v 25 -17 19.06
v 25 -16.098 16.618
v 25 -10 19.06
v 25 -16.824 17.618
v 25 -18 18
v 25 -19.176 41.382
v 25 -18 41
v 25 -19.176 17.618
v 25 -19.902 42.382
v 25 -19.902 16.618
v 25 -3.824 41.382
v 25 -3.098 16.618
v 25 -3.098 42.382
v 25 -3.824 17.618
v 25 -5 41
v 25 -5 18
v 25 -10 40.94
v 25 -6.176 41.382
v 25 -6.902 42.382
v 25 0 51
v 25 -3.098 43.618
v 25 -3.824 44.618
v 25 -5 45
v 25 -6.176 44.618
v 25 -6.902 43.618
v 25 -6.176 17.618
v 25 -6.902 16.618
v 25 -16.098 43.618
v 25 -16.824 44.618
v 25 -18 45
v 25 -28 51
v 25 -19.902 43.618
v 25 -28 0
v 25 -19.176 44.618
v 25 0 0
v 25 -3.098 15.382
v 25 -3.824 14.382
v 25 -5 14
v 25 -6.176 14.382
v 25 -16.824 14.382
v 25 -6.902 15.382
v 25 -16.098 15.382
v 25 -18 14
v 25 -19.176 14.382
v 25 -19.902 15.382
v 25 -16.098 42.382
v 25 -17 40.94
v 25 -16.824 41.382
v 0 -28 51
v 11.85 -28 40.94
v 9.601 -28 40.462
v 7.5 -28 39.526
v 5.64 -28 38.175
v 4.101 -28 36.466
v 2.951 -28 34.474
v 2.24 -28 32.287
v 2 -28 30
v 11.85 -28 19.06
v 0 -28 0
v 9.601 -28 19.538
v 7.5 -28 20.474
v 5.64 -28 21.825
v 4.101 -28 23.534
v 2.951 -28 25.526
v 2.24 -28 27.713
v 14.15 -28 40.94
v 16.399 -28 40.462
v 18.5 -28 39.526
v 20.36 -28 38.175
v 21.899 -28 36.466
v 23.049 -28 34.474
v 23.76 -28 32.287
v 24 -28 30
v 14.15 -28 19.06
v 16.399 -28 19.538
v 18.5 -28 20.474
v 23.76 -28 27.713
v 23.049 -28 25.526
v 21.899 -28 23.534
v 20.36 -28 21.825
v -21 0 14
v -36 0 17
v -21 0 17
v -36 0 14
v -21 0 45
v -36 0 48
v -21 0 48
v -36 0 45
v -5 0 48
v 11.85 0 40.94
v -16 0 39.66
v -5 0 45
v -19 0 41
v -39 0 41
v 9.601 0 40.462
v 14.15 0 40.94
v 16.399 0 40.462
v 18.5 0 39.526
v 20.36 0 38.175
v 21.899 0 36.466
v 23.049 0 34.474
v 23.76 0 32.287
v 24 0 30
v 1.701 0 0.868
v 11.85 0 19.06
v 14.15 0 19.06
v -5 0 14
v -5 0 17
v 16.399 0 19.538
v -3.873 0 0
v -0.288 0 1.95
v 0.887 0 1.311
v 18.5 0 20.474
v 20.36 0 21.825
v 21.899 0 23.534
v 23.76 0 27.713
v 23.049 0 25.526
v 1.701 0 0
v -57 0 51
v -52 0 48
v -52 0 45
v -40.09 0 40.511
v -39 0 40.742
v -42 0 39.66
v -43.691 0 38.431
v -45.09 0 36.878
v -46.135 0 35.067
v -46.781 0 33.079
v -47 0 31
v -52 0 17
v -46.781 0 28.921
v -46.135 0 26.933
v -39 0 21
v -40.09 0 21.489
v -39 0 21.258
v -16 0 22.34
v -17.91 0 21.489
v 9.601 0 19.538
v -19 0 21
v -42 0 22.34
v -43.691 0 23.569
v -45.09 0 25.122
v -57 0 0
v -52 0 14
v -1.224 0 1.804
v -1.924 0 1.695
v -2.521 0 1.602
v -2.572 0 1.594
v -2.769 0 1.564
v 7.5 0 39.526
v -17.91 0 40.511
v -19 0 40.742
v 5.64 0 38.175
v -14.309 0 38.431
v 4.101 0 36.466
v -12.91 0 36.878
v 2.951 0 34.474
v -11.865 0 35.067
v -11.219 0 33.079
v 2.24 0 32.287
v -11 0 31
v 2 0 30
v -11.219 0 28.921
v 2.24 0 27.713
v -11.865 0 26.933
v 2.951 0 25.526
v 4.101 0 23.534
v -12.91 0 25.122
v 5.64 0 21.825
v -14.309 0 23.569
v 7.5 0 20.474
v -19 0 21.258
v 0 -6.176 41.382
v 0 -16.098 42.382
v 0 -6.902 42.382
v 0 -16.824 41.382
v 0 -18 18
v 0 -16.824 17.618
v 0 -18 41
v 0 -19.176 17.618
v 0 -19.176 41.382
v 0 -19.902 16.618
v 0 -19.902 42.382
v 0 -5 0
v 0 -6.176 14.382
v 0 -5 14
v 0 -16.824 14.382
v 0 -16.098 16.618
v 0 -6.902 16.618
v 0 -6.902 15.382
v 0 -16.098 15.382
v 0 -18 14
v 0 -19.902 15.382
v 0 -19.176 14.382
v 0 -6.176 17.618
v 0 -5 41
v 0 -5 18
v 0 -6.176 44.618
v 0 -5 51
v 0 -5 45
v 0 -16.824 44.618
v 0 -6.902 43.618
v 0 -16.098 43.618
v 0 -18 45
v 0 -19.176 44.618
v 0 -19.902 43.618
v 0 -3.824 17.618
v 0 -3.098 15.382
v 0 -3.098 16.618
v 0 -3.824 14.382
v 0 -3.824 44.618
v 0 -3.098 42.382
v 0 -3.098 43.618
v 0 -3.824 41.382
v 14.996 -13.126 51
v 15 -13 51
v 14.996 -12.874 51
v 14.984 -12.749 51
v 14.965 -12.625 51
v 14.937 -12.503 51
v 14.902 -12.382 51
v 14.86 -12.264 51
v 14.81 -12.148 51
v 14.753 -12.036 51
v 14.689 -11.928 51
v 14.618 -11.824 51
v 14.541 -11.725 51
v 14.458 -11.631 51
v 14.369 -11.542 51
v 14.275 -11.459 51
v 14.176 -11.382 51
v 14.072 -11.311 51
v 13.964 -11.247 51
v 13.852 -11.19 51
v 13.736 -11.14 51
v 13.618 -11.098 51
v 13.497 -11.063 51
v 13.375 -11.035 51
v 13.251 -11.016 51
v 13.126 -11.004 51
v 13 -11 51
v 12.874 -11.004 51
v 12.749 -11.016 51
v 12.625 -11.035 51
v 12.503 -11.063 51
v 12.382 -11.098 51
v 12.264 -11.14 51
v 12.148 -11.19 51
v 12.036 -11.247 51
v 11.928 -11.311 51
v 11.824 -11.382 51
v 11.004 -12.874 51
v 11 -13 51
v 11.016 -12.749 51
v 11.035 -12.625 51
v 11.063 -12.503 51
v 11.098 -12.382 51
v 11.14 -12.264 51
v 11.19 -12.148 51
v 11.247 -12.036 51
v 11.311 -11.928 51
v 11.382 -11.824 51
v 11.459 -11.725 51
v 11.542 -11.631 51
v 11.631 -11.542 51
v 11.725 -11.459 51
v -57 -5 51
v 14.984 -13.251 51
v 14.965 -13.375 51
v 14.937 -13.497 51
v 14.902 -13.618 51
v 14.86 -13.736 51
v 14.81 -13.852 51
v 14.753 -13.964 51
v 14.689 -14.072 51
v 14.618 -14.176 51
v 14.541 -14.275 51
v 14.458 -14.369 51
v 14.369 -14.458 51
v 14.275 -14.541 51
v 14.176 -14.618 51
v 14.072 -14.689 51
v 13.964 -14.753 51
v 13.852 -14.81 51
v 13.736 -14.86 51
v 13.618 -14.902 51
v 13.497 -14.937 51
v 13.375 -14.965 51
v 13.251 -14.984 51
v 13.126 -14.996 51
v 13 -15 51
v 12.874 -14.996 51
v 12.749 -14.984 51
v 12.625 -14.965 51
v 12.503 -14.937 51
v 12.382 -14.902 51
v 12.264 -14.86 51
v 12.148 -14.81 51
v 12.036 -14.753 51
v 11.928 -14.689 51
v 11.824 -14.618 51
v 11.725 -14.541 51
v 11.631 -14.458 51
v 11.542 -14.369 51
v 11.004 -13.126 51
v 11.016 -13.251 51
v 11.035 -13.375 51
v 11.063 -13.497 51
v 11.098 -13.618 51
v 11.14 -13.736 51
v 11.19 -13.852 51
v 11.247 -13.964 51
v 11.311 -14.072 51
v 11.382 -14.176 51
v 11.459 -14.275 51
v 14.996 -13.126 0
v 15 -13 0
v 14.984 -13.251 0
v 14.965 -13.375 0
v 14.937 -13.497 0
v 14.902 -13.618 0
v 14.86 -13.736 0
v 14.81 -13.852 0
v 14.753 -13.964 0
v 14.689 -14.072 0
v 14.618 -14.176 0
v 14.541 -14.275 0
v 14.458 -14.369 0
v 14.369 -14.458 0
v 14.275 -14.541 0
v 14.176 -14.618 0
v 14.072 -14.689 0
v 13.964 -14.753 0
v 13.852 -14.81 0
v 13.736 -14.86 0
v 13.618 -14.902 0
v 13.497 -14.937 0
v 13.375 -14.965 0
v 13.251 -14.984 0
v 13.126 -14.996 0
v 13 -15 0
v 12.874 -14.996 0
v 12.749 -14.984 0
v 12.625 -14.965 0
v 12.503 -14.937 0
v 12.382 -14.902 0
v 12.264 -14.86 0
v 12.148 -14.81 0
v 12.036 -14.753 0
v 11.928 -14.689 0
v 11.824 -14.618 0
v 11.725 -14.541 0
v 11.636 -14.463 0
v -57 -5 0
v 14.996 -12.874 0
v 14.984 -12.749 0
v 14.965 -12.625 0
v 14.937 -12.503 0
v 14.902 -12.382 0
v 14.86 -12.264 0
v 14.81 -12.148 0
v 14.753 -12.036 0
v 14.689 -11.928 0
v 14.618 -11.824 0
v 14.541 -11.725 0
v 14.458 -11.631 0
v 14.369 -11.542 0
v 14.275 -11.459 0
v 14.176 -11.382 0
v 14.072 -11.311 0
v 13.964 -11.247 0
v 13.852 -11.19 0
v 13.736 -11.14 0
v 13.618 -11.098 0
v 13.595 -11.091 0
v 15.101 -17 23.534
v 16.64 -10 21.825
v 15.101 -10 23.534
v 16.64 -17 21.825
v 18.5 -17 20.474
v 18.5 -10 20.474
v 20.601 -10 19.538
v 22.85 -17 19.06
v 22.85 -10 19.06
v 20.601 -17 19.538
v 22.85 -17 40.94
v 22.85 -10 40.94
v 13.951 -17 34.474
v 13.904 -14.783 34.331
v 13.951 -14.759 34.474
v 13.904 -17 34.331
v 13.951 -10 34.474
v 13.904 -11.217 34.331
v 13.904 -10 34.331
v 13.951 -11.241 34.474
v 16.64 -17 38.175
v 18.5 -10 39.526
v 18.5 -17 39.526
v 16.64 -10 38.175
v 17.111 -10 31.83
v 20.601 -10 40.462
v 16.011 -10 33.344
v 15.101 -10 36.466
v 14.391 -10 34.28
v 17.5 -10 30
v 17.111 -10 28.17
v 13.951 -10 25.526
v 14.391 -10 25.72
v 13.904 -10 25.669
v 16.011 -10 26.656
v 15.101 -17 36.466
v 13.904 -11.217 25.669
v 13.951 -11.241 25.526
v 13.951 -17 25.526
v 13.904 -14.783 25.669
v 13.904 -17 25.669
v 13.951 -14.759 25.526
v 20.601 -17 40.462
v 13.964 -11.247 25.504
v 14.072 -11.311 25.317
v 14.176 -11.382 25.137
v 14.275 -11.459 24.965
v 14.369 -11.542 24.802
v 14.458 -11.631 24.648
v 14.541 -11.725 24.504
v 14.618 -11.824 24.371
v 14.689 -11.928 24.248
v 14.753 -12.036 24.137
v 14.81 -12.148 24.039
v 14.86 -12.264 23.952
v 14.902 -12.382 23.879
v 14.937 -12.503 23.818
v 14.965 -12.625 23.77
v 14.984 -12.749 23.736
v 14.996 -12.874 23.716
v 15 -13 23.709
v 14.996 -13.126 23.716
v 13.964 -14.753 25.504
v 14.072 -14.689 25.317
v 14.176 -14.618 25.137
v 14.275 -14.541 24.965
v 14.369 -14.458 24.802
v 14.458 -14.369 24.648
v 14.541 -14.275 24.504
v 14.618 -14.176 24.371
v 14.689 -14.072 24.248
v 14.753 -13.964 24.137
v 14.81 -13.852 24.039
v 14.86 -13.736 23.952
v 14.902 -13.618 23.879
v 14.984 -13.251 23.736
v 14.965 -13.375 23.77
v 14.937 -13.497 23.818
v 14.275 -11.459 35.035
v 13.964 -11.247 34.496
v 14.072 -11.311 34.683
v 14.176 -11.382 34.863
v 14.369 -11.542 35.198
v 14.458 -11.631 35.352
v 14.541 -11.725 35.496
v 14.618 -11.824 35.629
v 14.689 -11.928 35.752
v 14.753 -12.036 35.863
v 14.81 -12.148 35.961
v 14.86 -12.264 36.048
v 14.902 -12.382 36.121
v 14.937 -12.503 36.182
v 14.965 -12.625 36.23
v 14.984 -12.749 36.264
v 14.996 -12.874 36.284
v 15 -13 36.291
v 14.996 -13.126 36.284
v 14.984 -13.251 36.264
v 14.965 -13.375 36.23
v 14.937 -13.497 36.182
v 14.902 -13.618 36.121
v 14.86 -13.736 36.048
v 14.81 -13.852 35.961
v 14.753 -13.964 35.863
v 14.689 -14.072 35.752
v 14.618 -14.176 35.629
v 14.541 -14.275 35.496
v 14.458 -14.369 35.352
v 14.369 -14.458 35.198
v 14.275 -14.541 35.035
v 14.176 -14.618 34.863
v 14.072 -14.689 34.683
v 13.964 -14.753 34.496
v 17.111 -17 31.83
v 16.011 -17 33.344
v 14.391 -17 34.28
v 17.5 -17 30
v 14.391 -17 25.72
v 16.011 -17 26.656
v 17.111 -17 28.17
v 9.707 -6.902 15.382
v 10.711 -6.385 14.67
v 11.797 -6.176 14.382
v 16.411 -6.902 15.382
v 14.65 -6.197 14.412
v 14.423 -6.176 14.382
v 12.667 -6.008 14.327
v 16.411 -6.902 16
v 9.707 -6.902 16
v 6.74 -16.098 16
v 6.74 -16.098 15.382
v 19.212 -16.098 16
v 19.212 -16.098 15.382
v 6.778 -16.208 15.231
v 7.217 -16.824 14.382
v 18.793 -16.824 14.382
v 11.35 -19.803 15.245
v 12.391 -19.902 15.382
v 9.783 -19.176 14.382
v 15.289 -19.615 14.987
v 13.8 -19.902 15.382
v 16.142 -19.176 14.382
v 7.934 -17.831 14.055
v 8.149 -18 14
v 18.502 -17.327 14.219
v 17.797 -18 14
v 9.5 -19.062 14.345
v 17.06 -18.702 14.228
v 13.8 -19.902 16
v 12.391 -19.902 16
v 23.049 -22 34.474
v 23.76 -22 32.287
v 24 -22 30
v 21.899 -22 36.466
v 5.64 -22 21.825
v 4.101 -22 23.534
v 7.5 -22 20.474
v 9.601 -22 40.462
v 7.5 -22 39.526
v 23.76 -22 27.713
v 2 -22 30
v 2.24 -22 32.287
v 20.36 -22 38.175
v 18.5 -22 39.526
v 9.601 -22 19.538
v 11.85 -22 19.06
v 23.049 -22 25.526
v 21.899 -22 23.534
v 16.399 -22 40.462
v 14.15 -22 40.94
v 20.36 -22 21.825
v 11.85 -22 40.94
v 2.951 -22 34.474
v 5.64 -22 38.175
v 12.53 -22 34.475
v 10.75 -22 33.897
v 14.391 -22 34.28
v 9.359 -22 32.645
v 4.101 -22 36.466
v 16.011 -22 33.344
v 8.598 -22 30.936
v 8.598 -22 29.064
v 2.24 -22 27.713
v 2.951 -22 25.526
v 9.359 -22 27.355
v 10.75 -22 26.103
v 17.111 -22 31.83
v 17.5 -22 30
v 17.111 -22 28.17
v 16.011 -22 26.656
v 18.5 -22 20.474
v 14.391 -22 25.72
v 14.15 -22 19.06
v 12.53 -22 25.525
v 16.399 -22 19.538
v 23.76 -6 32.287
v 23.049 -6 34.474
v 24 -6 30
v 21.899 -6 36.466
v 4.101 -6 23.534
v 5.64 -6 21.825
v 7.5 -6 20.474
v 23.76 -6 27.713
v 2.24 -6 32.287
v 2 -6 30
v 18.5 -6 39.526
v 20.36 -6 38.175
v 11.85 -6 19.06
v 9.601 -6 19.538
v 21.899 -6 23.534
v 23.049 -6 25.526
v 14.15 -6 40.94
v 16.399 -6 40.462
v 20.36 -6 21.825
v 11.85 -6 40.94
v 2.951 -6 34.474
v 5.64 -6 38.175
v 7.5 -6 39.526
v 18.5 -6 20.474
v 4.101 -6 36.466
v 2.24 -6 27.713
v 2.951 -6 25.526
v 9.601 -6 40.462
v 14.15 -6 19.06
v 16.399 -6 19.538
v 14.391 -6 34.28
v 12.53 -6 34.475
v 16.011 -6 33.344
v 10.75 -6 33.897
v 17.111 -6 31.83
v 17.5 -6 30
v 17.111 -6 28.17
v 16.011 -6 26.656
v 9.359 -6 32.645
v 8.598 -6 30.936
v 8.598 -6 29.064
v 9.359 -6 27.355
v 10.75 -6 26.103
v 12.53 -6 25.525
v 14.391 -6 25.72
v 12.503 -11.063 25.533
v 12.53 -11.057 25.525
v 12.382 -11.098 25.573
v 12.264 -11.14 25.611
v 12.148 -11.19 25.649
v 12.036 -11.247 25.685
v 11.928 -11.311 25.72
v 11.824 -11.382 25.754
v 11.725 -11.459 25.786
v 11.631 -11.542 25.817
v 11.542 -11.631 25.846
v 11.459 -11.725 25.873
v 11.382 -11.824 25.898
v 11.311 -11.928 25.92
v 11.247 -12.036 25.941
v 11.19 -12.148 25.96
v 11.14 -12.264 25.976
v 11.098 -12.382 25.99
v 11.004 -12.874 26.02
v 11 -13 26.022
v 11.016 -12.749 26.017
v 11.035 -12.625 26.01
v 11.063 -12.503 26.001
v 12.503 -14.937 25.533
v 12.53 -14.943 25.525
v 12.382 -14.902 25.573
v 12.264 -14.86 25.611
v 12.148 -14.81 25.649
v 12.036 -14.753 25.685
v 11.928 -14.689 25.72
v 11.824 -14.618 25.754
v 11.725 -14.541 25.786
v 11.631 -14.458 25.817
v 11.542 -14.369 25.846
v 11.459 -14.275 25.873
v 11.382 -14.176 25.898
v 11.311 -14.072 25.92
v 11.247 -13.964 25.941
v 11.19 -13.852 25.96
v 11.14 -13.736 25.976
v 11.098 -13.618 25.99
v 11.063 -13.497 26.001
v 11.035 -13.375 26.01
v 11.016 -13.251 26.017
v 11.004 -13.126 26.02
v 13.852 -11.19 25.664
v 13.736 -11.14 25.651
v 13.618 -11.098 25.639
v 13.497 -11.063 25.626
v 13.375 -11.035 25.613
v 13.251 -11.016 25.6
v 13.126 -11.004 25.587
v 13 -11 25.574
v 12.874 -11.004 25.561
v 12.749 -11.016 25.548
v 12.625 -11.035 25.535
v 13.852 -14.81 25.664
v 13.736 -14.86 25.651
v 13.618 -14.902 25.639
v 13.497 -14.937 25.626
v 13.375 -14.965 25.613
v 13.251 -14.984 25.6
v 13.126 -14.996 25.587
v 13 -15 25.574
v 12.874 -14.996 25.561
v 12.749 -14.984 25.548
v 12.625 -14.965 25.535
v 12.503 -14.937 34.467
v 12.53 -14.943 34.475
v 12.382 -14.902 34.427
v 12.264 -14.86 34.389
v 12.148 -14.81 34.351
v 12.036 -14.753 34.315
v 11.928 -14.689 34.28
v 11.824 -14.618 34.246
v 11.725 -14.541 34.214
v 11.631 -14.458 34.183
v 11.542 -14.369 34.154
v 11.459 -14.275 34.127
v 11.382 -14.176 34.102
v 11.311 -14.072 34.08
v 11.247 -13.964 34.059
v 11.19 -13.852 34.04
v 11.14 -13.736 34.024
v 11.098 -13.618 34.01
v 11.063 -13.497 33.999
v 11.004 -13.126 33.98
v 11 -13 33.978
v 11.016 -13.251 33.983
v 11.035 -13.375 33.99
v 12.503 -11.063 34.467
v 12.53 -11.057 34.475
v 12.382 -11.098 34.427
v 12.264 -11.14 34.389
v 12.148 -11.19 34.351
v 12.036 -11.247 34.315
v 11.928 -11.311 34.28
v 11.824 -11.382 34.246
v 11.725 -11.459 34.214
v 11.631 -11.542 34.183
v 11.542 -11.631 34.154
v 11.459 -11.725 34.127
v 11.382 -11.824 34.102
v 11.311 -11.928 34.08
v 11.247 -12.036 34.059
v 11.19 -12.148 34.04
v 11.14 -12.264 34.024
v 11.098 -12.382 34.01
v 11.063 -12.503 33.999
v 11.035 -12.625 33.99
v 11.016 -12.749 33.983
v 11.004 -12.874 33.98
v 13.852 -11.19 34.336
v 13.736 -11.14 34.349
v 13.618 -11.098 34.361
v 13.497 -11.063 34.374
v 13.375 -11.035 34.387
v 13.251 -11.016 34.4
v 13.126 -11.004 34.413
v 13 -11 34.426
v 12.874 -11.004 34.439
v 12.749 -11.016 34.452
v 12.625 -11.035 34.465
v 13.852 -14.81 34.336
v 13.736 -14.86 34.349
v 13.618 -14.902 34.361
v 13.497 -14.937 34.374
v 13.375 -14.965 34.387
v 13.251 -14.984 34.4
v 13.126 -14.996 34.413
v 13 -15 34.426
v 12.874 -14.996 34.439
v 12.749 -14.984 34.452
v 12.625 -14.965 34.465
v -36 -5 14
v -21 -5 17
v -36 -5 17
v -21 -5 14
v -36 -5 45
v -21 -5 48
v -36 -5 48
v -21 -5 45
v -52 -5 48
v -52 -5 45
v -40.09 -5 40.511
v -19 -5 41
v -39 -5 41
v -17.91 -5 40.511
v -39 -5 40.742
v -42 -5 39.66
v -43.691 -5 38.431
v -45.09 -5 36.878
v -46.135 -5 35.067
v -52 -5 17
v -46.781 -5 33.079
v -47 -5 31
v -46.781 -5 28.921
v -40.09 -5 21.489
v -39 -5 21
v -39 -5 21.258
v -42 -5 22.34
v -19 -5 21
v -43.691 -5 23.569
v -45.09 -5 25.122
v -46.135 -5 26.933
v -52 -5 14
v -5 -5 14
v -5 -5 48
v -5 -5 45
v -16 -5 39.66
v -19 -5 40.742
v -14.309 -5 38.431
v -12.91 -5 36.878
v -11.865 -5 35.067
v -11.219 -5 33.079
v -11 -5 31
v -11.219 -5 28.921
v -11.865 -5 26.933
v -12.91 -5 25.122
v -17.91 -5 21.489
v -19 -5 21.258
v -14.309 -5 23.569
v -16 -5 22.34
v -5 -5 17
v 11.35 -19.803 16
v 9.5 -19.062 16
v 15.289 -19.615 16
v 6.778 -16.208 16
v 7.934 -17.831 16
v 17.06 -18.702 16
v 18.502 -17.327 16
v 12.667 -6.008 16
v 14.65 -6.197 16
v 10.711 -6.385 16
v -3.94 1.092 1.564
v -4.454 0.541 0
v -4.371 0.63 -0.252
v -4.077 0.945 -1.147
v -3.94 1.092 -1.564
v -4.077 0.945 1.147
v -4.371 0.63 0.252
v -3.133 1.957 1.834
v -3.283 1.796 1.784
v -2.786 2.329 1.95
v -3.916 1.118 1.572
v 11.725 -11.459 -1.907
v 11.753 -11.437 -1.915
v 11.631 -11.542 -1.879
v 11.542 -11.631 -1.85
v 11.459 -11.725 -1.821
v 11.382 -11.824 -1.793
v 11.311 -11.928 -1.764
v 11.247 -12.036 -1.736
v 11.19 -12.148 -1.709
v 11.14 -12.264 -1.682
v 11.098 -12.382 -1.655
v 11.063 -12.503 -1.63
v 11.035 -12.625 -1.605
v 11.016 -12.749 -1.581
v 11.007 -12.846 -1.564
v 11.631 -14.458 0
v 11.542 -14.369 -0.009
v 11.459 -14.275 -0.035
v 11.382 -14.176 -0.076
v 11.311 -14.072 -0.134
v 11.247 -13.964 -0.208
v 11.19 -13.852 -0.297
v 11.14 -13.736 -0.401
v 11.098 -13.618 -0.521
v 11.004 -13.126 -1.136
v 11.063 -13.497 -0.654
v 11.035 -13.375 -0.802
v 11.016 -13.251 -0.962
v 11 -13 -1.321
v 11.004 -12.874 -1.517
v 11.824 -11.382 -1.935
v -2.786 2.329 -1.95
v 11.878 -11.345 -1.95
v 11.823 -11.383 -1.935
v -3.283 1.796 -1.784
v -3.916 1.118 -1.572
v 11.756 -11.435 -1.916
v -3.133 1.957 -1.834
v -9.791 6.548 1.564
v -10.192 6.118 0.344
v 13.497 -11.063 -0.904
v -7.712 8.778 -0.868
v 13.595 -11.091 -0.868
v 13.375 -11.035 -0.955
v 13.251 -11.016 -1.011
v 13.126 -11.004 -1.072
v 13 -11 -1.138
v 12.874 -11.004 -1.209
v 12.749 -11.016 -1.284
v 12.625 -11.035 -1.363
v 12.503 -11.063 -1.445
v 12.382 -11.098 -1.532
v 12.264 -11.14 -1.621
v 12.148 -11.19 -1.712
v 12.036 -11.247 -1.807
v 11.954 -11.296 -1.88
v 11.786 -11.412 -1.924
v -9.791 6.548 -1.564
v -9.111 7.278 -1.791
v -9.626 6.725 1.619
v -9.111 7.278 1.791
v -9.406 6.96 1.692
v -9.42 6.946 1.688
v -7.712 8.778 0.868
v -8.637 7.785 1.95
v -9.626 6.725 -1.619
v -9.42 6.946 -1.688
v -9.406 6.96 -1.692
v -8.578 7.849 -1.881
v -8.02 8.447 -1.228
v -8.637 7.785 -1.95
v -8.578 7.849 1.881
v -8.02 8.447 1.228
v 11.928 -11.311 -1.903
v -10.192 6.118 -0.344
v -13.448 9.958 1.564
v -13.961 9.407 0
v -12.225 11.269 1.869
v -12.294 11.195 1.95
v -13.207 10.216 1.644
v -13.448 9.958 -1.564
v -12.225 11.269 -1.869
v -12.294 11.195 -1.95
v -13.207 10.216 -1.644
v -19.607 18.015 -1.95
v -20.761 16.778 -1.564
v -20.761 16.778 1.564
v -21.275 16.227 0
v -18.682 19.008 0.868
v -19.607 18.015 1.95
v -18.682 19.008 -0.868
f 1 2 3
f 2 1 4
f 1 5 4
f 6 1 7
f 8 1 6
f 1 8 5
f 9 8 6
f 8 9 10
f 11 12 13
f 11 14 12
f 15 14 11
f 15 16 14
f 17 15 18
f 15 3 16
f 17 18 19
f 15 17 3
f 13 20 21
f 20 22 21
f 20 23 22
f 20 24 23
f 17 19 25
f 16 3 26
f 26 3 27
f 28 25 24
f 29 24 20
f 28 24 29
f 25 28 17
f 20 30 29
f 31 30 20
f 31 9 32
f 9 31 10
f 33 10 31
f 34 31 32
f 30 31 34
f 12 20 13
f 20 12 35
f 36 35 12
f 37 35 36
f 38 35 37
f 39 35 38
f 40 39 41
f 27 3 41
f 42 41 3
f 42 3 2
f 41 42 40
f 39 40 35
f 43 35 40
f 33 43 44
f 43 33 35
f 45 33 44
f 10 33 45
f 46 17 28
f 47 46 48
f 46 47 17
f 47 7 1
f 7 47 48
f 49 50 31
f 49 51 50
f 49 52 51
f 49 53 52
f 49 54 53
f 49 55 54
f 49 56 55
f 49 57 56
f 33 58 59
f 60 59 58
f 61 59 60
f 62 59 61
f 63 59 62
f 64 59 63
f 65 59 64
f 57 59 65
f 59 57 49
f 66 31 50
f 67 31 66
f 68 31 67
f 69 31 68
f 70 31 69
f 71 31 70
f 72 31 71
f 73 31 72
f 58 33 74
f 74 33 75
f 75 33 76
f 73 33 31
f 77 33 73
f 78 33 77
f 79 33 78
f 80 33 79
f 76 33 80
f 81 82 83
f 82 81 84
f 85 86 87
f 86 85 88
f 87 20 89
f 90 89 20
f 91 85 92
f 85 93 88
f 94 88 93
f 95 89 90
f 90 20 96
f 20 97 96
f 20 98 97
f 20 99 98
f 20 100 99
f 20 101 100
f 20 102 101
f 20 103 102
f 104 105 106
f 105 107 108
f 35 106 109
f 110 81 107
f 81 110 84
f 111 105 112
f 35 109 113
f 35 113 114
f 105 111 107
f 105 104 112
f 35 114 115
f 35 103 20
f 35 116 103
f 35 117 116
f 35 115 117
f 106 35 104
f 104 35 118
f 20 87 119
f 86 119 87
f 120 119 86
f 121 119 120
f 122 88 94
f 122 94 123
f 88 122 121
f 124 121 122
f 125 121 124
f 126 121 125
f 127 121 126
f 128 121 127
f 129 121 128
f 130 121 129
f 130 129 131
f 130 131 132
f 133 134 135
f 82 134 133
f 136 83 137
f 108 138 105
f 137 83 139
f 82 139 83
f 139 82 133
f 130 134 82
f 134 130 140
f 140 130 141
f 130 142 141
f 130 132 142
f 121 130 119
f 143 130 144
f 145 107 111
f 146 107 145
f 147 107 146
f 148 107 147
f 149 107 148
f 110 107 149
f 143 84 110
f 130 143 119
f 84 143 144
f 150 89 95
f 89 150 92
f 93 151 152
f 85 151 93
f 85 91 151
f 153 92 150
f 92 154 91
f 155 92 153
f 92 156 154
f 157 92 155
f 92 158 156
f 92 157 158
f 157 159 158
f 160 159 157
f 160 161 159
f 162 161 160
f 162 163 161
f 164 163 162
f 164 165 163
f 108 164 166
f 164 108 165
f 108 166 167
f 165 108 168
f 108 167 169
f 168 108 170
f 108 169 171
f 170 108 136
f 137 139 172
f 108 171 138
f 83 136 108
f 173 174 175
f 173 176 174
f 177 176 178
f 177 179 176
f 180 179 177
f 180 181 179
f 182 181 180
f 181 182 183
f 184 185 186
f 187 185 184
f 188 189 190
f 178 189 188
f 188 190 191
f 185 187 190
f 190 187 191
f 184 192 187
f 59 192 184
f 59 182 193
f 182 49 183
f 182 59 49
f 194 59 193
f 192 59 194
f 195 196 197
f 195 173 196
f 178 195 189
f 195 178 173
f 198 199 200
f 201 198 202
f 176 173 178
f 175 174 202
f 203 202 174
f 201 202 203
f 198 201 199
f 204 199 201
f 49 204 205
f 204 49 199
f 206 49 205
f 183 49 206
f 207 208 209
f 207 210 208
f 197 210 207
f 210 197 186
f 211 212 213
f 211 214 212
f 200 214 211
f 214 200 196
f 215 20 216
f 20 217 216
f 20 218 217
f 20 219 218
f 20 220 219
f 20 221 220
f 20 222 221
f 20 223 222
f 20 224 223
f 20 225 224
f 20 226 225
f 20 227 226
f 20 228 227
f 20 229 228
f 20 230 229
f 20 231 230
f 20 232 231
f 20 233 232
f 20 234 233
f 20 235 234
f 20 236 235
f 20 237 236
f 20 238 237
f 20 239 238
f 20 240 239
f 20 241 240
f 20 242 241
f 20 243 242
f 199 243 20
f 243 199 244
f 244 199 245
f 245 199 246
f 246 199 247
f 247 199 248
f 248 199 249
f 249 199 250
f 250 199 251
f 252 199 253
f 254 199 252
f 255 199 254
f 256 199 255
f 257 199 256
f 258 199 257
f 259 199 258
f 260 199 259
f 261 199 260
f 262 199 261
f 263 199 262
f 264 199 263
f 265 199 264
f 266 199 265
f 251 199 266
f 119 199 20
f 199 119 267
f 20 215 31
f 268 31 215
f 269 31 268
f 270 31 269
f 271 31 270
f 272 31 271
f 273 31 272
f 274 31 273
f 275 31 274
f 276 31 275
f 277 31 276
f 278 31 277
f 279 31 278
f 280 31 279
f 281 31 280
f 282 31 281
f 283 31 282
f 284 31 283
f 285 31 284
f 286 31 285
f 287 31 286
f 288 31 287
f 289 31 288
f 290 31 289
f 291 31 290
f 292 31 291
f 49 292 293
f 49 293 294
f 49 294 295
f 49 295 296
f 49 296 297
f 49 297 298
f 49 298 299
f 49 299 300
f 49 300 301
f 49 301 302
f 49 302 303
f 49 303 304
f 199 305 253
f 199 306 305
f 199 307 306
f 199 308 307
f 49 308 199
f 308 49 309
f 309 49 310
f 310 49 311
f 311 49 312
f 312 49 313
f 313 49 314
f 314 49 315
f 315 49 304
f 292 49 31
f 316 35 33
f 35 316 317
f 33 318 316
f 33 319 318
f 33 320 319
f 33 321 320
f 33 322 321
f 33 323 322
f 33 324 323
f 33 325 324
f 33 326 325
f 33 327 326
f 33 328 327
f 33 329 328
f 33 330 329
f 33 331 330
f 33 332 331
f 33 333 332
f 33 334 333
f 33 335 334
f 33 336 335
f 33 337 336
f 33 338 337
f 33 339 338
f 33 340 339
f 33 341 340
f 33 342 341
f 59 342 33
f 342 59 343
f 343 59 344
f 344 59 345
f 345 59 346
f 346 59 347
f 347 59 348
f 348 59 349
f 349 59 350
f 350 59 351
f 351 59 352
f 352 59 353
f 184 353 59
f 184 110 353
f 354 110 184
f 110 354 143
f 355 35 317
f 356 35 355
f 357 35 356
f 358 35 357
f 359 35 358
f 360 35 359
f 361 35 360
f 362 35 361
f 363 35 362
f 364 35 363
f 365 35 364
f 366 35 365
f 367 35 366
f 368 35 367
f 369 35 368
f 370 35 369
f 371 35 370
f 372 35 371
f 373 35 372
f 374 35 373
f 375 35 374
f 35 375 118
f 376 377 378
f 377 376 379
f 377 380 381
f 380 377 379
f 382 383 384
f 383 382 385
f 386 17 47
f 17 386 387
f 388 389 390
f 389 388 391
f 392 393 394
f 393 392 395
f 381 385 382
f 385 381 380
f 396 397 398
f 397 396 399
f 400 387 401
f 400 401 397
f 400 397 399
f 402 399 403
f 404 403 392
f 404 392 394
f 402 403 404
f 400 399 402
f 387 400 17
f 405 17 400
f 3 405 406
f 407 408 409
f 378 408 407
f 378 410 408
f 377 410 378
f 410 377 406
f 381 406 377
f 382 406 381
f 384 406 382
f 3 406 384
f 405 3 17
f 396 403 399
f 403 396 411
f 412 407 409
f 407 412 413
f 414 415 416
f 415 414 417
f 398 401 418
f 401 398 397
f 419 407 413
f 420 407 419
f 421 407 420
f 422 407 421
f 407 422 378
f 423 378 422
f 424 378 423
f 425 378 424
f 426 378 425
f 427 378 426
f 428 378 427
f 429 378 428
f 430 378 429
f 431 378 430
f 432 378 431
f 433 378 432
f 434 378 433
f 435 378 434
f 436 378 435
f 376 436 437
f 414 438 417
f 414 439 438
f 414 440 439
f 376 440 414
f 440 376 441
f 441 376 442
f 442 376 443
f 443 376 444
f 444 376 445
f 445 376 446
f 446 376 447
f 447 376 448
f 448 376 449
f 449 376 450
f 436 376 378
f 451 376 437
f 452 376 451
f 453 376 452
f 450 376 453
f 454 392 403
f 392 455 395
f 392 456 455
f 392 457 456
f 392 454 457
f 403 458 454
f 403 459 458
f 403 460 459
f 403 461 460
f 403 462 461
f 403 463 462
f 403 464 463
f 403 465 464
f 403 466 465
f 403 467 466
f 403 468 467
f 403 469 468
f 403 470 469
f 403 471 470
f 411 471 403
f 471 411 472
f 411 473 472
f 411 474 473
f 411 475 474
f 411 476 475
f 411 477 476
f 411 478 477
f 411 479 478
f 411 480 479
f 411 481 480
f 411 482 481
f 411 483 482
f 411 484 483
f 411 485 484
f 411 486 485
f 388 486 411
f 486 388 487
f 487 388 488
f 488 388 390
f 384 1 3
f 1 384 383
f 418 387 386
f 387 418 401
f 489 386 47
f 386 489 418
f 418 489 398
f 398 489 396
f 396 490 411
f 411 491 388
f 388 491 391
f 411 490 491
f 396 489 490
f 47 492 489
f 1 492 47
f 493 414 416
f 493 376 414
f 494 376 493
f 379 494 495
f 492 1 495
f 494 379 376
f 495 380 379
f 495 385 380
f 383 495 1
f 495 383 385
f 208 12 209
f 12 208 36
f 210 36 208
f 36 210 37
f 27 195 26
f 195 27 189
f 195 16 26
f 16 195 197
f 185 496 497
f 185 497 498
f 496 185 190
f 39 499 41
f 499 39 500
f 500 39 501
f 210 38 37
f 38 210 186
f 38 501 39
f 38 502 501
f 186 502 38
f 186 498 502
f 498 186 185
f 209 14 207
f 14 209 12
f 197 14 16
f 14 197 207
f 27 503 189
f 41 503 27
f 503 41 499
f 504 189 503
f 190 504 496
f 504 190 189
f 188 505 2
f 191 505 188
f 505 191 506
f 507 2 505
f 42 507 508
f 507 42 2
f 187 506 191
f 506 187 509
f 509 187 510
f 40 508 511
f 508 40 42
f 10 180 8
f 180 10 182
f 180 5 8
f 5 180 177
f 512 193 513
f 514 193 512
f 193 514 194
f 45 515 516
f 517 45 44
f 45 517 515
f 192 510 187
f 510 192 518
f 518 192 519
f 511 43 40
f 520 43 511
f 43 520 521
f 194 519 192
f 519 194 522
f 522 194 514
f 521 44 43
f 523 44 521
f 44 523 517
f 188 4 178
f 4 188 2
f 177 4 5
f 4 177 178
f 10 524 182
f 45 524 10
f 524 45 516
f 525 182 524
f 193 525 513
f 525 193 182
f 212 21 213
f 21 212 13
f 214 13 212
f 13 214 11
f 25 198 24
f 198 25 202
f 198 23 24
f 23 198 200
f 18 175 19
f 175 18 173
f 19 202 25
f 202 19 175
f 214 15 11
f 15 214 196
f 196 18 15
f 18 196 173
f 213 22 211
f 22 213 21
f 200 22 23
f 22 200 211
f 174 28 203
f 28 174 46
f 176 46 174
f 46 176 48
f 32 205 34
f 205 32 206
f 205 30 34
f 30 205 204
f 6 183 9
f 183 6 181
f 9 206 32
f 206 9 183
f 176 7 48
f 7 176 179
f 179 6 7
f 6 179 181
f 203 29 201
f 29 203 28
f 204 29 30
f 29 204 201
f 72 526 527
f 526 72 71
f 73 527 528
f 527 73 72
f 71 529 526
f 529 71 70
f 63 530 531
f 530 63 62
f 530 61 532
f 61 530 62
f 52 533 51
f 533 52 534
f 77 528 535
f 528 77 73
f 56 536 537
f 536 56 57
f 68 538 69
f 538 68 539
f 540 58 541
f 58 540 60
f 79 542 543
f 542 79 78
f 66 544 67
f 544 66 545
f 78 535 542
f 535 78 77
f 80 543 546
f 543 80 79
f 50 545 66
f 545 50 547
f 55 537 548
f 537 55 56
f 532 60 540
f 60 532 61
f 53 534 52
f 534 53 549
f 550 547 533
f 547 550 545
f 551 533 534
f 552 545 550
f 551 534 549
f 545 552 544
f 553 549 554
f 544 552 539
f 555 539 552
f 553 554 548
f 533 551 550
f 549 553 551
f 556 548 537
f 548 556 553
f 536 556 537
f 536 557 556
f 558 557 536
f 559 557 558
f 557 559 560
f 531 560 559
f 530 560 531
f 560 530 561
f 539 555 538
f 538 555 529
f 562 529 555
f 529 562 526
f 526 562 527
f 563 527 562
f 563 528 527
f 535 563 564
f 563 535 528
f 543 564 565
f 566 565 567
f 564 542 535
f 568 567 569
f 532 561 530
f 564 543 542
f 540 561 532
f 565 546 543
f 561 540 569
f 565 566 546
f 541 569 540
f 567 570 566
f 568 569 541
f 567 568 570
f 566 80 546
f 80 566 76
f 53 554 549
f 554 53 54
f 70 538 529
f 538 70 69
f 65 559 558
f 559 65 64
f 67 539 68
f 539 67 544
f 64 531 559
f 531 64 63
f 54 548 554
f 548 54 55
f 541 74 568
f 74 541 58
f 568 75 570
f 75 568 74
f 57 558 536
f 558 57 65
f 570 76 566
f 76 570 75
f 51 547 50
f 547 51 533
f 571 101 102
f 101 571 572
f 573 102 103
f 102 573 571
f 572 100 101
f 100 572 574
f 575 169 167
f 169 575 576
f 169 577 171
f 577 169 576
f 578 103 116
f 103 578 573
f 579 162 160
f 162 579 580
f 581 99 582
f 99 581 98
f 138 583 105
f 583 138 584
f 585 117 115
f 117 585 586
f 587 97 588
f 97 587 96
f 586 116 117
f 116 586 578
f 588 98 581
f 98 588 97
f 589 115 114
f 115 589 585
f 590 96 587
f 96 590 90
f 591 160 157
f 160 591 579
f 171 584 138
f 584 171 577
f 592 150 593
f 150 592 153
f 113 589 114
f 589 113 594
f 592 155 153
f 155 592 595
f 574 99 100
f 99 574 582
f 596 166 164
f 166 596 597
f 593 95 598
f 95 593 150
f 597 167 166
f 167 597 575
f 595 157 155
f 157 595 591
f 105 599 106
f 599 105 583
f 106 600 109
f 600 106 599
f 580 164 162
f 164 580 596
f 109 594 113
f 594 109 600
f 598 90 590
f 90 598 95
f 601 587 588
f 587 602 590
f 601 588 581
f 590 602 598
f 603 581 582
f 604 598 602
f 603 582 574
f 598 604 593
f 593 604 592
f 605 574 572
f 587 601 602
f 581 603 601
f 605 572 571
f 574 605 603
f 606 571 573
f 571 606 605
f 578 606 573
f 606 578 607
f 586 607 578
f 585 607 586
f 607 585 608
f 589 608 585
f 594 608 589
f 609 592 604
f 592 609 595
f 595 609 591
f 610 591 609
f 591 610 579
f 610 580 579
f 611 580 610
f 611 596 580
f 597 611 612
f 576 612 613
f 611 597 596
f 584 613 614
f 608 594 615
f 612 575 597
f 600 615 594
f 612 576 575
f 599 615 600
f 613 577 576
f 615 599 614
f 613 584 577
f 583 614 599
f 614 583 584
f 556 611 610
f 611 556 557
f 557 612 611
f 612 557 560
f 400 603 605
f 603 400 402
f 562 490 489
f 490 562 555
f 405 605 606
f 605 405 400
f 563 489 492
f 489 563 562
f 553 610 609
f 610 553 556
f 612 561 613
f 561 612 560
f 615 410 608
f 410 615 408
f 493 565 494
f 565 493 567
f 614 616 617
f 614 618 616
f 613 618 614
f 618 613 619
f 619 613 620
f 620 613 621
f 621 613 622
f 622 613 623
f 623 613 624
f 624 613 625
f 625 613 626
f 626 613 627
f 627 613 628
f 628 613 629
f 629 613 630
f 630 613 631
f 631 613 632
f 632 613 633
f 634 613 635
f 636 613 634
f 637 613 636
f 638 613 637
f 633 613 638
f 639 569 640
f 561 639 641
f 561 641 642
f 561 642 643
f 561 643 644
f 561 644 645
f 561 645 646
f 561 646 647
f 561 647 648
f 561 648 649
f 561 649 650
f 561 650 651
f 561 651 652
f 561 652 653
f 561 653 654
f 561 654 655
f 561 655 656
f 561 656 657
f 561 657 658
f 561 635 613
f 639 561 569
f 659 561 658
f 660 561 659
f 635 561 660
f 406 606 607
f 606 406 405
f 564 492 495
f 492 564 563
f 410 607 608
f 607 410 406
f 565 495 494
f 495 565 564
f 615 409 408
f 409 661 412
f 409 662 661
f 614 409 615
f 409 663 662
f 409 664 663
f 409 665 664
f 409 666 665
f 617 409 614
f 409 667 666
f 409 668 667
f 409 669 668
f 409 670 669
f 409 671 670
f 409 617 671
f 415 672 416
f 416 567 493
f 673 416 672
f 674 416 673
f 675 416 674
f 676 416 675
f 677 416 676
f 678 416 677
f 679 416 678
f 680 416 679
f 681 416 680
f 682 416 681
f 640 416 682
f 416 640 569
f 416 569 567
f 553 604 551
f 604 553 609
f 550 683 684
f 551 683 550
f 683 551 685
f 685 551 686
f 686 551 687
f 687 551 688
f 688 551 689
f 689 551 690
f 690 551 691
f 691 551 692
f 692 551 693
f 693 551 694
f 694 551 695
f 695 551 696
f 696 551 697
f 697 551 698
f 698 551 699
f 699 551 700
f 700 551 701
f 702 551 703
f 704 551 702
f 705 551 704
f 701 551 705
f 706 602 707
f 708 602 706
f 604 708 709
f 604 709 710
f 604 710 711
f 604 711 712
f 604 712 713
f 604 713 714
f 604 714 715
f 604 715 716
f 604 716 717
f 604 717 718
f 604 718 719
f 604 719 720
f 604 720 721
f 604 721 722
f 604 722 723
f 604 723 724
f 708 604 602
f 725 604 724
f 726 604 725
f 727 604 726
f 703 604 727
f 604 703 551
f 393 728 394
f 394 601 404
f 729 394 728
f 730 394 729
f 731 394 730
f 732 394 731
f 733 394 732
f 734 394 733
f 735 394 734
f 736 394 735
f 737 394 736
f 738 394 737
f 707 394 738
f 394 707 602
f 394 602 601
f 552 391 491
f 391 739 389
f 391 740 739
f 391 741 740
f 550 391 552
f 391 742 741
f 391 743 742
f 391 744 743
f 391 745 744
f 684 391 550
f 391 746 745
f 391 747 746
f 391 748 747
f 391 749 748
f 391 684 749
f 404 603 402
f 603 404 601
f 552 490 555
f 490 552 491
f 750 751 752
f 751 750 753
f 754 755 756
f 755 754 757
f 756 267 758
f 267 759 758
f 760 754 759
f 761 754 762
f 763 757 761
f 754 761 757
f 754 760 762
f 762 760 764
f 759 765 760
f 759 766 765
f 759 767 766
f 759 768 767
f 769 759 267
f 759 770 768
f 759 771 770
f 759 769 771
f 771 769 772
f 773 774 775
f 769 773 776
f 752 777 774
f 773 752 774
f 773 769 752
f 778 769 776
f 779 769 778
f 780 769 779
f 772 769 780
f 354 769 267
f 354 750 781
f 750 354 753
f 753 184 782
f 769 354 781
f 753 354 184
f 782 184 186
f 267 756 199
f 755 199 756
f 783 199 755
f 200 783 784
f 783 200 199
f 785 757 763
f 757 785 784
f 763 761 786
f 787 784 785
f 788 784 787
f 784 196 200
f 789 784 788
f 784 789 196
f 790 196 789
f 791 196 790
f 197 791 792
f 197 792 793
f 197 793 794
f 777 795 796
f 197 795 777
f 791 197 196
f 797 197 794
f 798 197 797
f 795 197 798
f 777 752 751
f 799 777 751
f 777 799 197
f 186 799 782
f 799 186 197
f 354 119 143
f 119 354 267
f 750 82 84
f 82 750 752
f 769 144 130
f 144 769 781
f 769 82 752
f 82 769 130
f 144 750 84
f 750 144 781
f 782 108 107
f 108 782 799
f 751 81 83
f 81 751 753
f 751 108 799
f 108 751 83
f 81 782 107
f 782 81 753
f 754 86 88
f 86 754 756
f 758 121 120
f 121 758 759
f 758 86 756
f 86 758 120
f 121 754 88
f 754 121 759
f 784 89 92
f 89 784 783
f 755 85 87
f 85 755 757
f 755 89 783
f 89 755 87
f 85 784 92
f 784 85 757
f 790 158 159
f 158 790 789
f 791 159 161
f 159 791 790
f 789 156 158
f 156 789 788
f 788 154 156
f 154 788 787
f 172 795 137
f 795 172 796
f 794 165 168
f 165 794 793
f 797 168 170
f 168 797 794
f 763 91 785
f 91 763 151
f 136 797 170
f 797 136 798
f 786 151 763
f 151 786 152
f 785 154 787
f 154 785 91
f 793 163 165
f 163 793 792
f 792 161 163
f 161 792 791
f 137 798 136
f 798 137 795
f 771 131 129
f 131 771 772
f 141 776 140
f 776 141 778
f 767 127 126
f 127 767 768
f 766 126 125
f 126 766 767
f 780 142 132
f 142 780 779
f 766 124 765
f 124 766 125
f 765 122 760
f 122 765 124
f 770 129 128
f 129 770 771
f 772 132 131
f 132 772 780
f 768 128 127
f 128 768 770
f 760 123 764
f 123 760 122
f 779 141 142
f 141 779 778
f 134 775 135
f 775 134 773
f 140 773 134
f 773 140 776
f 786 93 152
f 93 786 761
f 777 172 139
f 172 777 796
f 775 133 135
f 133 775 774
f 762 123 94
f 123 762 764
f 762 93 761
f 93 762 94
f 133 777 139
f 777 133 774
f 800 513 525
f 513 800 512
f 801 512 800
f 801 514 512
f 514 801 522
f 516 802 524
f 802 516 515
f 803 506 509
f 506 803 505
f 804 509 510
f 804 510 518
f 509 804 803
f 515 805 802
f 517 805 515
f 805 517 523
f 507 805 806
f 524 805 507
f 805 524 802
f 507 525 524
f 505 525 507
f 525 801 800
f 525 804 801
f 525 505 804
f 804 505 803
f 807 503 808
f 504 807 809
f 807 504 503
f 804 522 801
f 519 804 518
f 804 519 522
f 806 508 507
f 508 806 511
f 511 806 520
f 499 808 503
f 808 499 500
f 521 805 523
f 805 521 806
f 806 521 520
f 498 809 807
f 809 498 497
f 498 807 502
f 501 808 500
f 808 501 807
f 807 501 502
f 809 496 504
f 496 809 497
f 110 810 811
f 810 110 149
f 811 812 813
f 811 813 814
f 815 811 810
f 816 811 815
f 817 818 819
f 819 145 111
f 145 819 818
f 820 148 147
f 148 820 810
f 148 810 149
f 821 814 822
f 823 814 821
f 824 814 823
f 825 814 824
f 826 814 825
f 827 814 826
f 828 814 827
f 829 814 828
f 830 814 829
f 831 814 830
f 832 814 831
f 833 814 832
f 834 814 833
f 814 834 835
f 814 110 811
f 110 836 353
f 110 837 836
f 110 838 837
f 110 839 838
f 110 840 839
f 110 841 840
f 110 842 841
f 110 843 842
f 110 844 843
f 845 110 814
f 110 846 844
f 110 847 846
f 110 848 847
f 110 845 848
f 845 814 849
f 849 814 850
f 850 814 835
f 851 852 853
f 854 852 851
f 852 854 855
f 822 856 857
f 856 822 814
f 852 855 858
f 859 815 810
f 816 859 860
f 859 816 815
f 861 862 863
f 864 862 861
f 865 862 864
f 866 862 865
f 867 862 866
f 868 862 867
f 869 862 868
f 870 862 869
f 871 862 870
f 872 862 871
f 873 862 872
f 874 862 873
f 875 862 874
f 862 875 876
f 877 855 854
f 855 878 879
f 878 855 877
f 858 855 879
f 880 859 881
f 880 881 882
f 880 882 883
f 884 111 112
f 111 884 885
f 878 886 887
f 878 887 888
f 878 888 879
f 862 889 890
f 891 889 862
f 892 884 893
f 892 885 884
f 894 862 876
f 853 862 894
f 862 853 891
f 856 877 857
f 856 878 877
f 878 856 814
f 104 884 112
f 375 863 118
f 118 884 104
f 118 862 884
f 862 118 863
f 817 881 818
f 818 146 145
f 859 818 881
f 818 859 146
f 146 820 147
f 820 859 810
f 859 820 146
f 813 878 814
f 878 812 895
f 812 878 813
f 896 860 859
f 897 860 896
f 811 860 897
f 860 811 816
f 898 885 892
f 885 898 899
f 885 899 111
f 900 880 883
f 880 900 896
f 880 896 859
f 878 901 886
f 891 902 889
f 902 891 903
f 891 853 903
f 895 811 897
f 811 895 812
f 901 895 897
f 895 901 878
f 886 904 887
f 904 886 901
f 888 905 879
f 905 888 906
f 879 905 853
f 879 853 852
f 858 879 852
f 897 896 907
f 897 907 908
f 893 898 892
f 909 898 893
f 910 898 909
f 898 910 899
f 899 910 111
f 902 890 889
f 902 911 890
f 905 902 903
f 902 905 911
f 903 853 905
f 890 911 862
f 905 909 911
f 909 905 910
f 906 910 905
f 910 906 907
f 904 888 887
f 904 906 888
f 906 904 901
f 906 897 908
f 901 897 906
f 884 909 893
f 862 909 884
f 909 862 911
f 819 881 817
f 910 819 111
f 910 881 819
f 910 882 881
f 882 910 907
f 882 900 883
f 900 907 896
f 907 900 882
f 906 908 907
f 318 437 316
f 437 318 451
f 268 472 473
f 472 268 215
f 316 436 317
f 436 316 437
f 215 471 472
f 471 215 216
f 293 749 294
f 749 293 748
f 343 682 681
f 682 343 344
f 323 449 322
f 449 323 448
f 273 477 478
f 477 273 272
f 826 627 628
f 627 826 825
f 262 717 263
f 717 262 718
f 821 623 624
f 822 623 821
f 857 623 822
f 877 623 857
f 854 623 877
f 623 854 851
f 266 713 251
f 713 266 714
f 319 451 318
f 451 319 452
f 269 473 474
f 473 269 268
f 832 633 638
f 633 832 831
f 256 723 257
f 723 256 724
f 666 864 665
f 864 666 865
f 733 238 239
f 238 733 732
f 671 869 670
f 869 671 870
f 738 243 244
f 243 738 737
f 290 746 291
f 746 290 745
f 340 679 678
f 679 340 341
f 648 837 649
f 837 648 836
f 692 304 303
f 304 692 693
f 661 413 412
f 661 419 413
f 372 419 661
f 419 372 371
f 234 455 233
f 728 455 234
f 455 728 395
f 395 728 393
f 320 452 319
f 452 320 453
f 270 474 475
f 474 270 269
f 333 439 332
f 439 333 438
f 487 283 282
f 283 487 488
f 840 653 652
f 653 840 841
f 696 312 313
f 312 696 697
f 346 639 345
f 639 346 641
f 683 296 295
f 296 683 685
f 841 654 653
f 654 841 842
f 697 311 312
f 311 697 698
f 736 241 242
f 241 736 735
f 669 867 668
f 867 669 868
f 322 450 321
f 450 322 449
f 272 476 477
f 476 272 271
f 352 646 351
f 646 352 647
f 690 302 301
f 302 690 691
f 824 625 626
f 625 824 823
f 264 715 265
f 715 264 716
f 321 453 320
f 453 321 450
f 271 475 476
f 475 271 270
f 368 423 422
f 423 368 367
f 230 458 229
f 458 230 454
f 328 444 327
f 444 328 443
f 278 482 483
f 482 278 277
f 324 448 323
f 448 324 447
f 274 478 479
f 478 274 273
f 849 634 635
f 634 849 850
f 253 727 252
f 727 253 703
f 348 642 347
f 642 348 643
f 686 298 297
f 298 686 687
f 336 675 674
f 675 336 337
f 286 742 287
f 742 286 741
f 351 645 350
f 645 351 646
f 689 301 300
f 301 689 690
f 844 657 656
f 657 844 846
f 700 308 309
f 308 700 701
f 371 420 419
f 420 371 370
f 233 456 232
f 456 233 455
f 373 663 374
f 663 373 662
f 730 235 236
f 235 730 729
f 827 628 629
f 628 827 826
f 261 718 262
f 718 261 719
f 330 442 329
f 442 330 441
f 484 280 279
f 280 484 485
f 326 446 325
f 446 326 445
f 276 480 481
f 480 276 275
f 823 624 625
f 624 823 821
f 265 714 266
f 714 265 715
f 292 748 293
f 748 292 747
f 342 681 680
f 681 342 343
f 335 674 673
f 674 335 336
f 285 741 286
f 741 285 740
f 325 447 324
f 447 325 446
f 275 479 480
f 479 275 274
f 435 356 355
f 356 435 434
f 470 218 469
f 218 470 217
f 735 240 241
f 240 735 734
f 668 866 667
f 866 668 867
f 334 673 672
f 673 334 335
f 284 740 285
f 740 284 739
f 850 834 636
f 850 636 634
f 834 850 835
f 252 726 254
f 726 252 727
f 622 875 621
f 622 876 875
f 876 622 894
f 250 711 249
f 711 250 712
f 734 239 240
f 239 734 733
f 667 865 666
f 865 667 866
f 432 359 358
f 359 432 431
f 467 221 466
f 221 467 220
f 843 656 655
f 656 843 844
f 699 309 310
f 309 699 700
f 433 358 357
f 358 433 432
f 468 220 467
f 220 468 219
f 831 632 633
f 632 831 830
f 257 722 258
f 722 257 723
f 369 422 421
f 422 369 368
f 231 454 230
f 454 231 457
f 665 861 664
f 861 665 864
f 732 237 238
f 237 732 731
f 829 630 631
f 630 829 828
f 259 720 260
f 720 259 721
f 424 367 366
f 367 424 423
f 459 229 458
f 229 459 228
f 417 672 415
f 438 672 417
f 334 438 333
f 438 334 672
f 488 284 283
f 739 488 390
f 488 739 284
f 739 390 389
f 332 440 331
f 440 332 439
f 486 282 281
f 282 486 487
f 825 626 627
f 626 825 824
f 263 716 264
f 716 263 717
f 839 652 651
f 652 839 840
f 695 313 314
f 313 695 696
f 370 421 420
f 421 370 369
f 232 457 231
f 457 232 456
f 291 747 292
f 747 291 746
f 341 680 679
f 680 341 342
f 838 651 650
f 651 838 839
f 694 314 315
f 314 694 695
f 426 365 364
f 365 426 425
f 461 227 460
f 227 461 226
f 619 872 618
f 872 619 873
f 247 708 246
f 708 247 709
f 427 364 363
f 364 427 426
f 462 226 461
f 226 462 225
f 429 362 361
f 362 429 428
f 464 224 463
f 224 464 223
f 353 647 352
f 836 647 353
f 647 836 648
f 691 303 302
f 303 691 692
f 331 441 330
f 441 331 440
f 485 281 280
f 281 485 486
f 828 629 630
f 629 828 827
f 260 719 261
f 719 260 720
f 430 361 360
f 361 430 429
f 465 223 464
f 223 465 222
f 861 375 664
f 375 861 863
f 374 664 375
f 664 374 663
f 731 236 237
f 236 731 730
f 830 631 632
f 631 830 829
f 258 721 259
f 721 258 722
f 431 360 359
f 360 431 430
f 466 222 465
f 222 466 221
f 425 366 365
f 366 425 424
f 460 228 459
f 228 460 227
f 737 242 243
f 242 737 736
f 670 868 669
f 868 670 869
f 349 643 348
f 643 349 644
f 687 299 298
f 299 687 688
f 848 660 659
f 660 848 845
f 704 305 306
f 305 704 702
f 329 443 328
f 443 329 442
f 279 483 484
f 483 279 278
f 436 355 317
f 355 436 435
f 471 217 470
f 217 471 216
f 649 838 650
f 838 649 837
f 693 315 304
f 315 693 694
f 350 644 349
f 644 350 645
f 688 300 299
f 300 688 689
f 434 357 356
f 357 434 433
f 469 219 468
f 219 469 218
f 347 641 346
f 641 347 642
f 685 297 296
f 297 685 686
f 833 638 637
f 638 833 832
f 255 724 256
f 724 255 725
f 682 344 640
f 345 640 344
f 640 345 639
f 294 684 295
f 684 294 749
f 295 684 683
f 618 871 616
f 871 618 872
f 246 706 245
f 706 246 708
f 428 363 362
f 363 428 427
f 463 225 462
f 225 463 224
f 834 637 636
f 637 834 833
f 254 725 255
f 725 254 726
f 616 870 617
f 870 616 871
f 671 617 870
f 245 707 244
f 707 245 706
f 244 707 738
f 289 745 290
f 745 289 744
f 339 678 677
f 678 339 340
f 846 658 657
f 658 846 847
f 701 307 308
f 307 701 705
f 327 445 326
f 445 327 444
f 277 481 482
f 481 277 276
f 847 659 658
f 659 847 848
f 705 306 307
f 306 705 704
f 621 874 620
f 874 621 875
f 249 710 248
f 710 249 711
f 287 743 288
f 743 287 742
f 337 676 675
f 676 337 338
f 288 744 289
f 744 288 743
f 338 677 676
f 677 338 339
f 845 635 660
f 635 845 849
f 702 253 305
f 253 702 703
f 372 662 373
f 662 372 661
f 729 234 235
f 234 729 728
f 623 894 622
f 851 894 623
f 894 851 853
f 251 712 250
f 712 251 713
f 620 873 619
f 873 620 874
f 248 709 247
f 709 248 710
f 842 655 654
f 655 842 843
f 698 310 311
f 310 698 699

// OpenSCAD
module base() {
  //This is Rapman base
  axis_m5 = dxf_cross(file = "tool_holder.dxf", 
                      layer = "axis_m5");
  difference() {
    union() {
      linear_extrude(file = "tool_holder.dxf", 
                     layer = "base", height = 5, 
                     convexity = 2, $fn=100);
      linear_extrude(file = "tool_holder.dxf", 
                     layer = "limit", height = 5, 
                     convexity = 2);
      translate([axis_m5[0], axis_m5[1], 1]) 
        cylinder(h=16, r=7);
      translate([axis_m5[0]-5,axis_m5[1]+25,5]) 
        rotate([90,0,-13]) cylinder(h=22,r=2);
      translate([axis_m5[0]+8,axis_m5[1]+36,5]) 
        rotate([90,0,-13]) cylinder(h=30,r=2);
      translate([axis_m5[0]+16,axis_m5[1]+32,5]) 
        rotate([90,0,-13]) cylinder(h=35,r=2);
      translate([axis_m5[0]+26,axis_m5[1]+45,5]) 
        rotate([90,0,-13]) cylinder(h=45,r=2);
    }
    translate([axis_m5[0],axis_m5[1],-10]) 
      cylinder(h=40, r=2.5);    
    translate([0,0,-1]) 
      linear_extrude(file = "tool_holder.dxf", 
                     layer = "m5", height = 7, 
                     convexity = 2);
    translate([0,0,11]) 
      linear_extrude(file = "tool_holder.dxf", 
                     layer = "m5", height = 7, 
                     convexity = 2);
    translate([0,0,-10]) 
      linear_extrude(file = "tool_holder.dxf", 
                     layer = "turnhole", height = 55, 
                     convexity = 2);
  }
}

module base_hole() {
    translate([0,0,-10]) 
      linear_extrude(file = "tool_holder.dxf", 
                     layer = "attachement", height = 18, 
                     convexity = 2);
    translate([0,0,5]) 
      linear_extrude(file = "tool_holder.dxf", 
                     layer = "attachementm5", height = 6, 
                     convexity = 2);
}

module m4_hole(alpha) {
  axis_m4 = dxf_cross(file="dremel.dxf", 
                      layer="axis_m4");	
  rotate([90,0,alpha])
    union() {
      linear_extrude(file="dremel.dxf", 
                     layer = "m4_hole",
                     height = 8, convexity = 2);
      translate([axis_m4[0],axis_m4[1],1]) 
        cylinder(h=39, r=2, $fn=10);
    }
}

module drive() {
  difference() {
    cube([25,51,28]);
    translate([24,30,10]) cylinder(r=11, h=6+1);
    translate([-1,16,5]) m4_hole(90);
    translate([-1,16,13+5]) m4_hole(90);
    translate([-1,18+25,5]) m4_hole(90);
    translate([-1,18+25,13+5]) m4_hole(90);

    translate([13,30,22]) cylinder(r=11, h=6+1);
    translate([13,30,-1]) cylinder(r=11, h=6+1);
    translate([13,30,-1]) cylinder(r=4.5, h=35);

  }
}

module motor_holder() {
  difference() {
    translate([-57,0,0]) cube([57,51,5]);
    translate([-57+5,14,0]) cube([16,3,6]);
    translate([-57+5+31,14,0]) cube([16,3,6]);
    translate([-57+5,14+31,0]) cube([16,3,6]);
    translate([-57+5+31,14+31,0]) cube([16,3,6]);

    translate([-57+5+31,14+17,0]) cylinder(r=10, h=6);
    translate([-57+5+15,14+17,0]) cylinder(r=10, h=6);
 
    translate([-39,21,0]) cube([20,20,6]);
  }
}

module main() {
difference() {
  union() {
    drive();
    motor_holder();
    translate([13,0,13]) rotate([270,0,0]) rotate([0,0,240]) 
      base();
  }
  translate([13,100,13]) rotate([90,0,0]) 
    cylinder(r=2, h=190, $fn=100);
  translate([13,0,13]) rotate([270,0,0]) rotate([0,0,240]) 
      base_hole();
}
}

rotate([90,0,0]) main();
